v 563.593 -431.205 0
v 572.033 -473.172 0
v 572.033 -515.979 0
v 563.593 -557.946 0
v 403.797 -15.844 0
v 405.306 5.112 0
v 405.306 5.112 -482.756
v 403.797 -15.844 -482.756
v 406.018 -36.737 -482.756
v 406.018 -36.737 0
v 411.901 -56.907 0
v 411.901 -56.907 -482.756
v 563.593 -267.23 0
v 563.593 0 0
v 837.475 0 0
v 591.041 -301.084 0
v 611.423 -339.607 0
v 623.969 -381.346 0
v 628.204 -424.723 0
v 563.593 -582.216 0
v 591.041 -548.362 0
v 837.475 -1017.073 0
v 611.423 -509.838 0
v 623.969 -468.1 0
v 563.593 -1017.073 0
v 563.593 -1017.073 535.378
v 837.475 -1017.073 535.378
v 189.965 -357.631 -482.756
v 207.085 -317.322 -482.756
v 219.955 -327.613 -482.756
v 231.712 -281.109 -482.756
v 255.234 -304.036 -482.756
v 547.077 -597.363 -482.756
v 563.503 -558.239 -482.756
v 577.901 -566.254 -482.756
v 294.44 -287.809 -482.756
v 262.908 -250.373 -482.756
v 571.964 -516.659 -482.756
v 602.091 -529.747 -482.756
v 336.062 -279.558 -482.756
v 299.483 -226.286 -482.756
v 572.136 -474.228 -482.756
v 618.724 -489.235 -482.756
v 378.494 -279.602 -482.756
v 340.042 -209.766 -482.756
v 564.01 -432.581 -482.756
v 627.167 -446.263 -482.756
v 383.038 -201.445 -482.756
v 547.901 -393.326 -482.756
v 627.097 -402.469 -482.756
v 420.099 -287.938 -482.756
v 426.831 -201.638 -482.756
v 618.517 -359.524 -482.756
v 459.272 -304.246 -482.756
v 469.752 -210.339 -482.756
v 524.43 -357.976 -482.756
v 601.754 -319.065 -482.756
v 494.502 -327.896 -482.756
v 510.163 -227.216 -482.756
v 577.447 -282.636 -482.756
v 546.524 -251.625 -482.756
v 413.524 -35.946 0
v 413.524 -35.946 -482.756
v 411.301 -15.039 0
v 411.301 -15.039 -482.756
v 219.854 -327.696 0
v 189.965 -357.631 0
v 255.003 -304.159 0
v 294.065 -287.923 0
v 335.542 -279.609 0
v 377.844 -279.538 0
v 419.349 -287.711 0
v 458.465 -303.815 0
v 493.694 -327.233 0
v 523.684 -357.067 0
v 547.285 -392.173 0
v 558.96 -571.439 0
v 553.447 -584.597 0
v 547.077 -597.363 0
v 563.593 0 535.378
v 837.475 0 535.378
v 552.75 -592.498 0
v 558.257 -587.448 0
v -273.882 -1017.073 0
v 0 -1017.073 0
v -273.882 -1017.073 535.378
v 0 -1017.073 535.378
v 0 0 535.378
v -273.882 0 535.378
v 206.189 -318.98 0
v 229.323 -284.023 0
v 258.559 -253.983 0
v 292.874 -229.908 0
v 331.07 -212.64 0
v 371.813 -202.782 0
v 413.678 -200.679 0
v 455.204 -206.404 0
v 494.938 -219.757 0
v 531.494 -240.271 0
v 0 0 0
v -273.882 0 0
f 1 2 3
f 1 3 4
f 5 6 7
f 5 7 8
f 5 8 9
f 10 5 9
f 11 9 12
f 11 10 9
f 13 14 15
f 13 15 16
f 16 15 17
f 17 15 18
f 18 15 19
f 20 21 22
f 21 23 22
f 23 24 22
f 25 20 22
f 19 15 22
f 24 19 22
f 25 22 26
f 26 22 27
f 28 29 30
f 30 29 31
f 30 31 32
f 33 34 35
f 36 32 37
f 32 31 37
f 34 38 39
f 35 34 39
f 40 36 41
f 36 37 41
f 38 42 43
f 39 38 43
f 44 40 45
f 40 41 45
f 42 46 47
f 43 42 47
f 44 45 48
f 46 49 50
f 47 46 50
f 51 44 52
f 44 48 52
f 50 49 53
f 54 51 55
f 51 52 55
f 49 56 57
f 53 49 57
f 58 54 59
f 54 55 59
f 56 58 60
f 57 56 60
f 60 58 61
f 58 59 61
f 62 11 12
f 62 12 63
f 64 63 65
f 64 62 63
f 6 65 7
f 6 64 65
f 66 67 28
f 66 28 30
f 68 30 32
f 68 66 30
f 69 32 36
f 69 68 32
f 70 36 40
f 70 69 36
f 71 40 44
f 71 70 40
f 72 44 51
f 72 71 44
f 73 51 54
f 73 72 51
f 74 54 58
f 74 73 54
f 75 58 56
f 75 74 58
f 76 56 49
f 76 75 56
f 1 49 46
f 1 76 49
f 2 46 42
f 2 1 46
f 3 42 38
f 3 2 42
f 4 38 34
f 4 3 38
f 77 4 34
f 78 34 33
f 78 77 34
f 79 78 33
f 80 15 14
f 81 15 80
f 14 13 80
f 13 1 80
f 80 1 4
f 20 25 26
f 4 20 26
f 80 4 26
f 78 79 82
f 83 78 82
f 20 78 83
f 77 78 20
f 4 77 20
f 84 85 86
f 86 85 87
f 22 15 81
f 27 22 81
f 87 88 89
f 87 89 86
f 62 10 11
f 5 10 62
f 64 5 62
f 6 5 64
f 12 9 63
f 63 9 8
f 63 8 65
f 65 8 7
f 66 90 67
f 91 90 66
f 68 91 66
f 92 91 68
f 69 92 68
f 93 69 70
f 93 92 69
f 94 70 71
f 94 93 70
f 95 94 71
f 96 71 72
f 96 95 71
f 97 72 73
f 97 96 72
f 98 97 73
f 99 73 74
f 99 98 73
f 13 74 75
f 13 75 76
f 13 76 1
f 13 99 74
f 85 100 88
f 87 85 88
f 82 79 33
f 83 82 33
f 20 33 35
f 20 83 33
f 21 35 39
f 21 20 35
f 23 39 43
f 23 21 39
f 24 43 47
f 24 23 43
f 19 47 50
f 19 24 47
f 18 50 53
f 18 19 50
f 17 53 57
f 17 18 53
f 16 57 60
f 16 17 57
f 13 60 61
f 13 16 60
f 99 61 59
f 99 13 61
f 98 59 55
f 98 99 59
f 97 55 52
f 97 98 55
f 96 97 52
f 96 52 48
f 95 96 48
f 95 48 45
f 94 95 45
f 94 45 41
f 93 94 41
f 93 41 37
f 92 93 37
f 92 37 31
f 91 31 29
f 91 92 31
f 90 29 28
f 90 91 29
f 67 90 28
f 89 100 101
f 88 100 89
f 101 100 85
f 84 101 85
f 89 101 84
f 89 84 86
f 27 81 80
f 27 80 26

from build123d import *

# Parameters (mm, degrees)
F3_DEPTH      = 482.75577
F1_E0_RIGHT_W = 535.3775024414
F1_E0_RIGHT_H = 1017.07278
F4_DEPTH      = 273.88198
F1_E0_LEFT_W  = 535.3775024414
F1_E0_LEFT_H  = 1017.07278


with BuildPart() as f3:
    # F2 (on Top) → F3 (new body)
    with BuildSketch(Plane.XY):
        with BuildLine():
            ThreePointArc((189.9649500847, -357.6309978962), (477.4693061455, -315.2043475455), (547.0770597458, -597.3630547523))
            ThreePointArc((547.0770597458, -597.3630547523), (528.9406165931, -238.5311295286), (189.9649500847, -357.6309978962))
        make_face()
    extrude(amount=-F3_DEPTH)

    # F1_E0_right (on explicit) → F4 (join)
    with BuildSketch(Plane(origin=(837.4749422073, 0, 0), x_dir=(0, 0, 1), z_dir=(1, 0, 0))):
        with Locations((267.6887512207, 508.53639)):
            Rectangle(F1_E0_RIGHT_W, F1_E0_RIGHT_H)
    extrude(amount=-F4_DEPTH)


with BuildPart() as f3b:
    # F2 (on Top) → F3, piece 2 (new body)
    with BuildSketch(Plane.XY):
        with BuildLine():
            ThreePointArc((405.3064584732, 5.1124375314), (404.4428515066, -26.3399147003), (411.900691804, -56.9074938651))
            ThreePointArc((411.900691804, -56.9074938651), (412.8912838015, -25.4416400235), (405.3064584732, 5.1124375314))
        make_face()
    extrude(amount=-F3_DEPTH)


with BuildPart() as f4:
    # F1_E0_left (on explicit) → F4, piece 2 (new body)
    with BuildSketch(Plane(origin=(0, 0, 0), x_dir=(0, 0, 1), z_dir=(1, 0, 0))):
        with Locations((267.6887512207, 508.53639)):
            Rectangle(F1_E0_LEFT_W, F1_E0_LEFT_H)
    extrude(amount=-F4_DEPTH)


solid = Compound([f3.part, f3b.part, f4.part])
